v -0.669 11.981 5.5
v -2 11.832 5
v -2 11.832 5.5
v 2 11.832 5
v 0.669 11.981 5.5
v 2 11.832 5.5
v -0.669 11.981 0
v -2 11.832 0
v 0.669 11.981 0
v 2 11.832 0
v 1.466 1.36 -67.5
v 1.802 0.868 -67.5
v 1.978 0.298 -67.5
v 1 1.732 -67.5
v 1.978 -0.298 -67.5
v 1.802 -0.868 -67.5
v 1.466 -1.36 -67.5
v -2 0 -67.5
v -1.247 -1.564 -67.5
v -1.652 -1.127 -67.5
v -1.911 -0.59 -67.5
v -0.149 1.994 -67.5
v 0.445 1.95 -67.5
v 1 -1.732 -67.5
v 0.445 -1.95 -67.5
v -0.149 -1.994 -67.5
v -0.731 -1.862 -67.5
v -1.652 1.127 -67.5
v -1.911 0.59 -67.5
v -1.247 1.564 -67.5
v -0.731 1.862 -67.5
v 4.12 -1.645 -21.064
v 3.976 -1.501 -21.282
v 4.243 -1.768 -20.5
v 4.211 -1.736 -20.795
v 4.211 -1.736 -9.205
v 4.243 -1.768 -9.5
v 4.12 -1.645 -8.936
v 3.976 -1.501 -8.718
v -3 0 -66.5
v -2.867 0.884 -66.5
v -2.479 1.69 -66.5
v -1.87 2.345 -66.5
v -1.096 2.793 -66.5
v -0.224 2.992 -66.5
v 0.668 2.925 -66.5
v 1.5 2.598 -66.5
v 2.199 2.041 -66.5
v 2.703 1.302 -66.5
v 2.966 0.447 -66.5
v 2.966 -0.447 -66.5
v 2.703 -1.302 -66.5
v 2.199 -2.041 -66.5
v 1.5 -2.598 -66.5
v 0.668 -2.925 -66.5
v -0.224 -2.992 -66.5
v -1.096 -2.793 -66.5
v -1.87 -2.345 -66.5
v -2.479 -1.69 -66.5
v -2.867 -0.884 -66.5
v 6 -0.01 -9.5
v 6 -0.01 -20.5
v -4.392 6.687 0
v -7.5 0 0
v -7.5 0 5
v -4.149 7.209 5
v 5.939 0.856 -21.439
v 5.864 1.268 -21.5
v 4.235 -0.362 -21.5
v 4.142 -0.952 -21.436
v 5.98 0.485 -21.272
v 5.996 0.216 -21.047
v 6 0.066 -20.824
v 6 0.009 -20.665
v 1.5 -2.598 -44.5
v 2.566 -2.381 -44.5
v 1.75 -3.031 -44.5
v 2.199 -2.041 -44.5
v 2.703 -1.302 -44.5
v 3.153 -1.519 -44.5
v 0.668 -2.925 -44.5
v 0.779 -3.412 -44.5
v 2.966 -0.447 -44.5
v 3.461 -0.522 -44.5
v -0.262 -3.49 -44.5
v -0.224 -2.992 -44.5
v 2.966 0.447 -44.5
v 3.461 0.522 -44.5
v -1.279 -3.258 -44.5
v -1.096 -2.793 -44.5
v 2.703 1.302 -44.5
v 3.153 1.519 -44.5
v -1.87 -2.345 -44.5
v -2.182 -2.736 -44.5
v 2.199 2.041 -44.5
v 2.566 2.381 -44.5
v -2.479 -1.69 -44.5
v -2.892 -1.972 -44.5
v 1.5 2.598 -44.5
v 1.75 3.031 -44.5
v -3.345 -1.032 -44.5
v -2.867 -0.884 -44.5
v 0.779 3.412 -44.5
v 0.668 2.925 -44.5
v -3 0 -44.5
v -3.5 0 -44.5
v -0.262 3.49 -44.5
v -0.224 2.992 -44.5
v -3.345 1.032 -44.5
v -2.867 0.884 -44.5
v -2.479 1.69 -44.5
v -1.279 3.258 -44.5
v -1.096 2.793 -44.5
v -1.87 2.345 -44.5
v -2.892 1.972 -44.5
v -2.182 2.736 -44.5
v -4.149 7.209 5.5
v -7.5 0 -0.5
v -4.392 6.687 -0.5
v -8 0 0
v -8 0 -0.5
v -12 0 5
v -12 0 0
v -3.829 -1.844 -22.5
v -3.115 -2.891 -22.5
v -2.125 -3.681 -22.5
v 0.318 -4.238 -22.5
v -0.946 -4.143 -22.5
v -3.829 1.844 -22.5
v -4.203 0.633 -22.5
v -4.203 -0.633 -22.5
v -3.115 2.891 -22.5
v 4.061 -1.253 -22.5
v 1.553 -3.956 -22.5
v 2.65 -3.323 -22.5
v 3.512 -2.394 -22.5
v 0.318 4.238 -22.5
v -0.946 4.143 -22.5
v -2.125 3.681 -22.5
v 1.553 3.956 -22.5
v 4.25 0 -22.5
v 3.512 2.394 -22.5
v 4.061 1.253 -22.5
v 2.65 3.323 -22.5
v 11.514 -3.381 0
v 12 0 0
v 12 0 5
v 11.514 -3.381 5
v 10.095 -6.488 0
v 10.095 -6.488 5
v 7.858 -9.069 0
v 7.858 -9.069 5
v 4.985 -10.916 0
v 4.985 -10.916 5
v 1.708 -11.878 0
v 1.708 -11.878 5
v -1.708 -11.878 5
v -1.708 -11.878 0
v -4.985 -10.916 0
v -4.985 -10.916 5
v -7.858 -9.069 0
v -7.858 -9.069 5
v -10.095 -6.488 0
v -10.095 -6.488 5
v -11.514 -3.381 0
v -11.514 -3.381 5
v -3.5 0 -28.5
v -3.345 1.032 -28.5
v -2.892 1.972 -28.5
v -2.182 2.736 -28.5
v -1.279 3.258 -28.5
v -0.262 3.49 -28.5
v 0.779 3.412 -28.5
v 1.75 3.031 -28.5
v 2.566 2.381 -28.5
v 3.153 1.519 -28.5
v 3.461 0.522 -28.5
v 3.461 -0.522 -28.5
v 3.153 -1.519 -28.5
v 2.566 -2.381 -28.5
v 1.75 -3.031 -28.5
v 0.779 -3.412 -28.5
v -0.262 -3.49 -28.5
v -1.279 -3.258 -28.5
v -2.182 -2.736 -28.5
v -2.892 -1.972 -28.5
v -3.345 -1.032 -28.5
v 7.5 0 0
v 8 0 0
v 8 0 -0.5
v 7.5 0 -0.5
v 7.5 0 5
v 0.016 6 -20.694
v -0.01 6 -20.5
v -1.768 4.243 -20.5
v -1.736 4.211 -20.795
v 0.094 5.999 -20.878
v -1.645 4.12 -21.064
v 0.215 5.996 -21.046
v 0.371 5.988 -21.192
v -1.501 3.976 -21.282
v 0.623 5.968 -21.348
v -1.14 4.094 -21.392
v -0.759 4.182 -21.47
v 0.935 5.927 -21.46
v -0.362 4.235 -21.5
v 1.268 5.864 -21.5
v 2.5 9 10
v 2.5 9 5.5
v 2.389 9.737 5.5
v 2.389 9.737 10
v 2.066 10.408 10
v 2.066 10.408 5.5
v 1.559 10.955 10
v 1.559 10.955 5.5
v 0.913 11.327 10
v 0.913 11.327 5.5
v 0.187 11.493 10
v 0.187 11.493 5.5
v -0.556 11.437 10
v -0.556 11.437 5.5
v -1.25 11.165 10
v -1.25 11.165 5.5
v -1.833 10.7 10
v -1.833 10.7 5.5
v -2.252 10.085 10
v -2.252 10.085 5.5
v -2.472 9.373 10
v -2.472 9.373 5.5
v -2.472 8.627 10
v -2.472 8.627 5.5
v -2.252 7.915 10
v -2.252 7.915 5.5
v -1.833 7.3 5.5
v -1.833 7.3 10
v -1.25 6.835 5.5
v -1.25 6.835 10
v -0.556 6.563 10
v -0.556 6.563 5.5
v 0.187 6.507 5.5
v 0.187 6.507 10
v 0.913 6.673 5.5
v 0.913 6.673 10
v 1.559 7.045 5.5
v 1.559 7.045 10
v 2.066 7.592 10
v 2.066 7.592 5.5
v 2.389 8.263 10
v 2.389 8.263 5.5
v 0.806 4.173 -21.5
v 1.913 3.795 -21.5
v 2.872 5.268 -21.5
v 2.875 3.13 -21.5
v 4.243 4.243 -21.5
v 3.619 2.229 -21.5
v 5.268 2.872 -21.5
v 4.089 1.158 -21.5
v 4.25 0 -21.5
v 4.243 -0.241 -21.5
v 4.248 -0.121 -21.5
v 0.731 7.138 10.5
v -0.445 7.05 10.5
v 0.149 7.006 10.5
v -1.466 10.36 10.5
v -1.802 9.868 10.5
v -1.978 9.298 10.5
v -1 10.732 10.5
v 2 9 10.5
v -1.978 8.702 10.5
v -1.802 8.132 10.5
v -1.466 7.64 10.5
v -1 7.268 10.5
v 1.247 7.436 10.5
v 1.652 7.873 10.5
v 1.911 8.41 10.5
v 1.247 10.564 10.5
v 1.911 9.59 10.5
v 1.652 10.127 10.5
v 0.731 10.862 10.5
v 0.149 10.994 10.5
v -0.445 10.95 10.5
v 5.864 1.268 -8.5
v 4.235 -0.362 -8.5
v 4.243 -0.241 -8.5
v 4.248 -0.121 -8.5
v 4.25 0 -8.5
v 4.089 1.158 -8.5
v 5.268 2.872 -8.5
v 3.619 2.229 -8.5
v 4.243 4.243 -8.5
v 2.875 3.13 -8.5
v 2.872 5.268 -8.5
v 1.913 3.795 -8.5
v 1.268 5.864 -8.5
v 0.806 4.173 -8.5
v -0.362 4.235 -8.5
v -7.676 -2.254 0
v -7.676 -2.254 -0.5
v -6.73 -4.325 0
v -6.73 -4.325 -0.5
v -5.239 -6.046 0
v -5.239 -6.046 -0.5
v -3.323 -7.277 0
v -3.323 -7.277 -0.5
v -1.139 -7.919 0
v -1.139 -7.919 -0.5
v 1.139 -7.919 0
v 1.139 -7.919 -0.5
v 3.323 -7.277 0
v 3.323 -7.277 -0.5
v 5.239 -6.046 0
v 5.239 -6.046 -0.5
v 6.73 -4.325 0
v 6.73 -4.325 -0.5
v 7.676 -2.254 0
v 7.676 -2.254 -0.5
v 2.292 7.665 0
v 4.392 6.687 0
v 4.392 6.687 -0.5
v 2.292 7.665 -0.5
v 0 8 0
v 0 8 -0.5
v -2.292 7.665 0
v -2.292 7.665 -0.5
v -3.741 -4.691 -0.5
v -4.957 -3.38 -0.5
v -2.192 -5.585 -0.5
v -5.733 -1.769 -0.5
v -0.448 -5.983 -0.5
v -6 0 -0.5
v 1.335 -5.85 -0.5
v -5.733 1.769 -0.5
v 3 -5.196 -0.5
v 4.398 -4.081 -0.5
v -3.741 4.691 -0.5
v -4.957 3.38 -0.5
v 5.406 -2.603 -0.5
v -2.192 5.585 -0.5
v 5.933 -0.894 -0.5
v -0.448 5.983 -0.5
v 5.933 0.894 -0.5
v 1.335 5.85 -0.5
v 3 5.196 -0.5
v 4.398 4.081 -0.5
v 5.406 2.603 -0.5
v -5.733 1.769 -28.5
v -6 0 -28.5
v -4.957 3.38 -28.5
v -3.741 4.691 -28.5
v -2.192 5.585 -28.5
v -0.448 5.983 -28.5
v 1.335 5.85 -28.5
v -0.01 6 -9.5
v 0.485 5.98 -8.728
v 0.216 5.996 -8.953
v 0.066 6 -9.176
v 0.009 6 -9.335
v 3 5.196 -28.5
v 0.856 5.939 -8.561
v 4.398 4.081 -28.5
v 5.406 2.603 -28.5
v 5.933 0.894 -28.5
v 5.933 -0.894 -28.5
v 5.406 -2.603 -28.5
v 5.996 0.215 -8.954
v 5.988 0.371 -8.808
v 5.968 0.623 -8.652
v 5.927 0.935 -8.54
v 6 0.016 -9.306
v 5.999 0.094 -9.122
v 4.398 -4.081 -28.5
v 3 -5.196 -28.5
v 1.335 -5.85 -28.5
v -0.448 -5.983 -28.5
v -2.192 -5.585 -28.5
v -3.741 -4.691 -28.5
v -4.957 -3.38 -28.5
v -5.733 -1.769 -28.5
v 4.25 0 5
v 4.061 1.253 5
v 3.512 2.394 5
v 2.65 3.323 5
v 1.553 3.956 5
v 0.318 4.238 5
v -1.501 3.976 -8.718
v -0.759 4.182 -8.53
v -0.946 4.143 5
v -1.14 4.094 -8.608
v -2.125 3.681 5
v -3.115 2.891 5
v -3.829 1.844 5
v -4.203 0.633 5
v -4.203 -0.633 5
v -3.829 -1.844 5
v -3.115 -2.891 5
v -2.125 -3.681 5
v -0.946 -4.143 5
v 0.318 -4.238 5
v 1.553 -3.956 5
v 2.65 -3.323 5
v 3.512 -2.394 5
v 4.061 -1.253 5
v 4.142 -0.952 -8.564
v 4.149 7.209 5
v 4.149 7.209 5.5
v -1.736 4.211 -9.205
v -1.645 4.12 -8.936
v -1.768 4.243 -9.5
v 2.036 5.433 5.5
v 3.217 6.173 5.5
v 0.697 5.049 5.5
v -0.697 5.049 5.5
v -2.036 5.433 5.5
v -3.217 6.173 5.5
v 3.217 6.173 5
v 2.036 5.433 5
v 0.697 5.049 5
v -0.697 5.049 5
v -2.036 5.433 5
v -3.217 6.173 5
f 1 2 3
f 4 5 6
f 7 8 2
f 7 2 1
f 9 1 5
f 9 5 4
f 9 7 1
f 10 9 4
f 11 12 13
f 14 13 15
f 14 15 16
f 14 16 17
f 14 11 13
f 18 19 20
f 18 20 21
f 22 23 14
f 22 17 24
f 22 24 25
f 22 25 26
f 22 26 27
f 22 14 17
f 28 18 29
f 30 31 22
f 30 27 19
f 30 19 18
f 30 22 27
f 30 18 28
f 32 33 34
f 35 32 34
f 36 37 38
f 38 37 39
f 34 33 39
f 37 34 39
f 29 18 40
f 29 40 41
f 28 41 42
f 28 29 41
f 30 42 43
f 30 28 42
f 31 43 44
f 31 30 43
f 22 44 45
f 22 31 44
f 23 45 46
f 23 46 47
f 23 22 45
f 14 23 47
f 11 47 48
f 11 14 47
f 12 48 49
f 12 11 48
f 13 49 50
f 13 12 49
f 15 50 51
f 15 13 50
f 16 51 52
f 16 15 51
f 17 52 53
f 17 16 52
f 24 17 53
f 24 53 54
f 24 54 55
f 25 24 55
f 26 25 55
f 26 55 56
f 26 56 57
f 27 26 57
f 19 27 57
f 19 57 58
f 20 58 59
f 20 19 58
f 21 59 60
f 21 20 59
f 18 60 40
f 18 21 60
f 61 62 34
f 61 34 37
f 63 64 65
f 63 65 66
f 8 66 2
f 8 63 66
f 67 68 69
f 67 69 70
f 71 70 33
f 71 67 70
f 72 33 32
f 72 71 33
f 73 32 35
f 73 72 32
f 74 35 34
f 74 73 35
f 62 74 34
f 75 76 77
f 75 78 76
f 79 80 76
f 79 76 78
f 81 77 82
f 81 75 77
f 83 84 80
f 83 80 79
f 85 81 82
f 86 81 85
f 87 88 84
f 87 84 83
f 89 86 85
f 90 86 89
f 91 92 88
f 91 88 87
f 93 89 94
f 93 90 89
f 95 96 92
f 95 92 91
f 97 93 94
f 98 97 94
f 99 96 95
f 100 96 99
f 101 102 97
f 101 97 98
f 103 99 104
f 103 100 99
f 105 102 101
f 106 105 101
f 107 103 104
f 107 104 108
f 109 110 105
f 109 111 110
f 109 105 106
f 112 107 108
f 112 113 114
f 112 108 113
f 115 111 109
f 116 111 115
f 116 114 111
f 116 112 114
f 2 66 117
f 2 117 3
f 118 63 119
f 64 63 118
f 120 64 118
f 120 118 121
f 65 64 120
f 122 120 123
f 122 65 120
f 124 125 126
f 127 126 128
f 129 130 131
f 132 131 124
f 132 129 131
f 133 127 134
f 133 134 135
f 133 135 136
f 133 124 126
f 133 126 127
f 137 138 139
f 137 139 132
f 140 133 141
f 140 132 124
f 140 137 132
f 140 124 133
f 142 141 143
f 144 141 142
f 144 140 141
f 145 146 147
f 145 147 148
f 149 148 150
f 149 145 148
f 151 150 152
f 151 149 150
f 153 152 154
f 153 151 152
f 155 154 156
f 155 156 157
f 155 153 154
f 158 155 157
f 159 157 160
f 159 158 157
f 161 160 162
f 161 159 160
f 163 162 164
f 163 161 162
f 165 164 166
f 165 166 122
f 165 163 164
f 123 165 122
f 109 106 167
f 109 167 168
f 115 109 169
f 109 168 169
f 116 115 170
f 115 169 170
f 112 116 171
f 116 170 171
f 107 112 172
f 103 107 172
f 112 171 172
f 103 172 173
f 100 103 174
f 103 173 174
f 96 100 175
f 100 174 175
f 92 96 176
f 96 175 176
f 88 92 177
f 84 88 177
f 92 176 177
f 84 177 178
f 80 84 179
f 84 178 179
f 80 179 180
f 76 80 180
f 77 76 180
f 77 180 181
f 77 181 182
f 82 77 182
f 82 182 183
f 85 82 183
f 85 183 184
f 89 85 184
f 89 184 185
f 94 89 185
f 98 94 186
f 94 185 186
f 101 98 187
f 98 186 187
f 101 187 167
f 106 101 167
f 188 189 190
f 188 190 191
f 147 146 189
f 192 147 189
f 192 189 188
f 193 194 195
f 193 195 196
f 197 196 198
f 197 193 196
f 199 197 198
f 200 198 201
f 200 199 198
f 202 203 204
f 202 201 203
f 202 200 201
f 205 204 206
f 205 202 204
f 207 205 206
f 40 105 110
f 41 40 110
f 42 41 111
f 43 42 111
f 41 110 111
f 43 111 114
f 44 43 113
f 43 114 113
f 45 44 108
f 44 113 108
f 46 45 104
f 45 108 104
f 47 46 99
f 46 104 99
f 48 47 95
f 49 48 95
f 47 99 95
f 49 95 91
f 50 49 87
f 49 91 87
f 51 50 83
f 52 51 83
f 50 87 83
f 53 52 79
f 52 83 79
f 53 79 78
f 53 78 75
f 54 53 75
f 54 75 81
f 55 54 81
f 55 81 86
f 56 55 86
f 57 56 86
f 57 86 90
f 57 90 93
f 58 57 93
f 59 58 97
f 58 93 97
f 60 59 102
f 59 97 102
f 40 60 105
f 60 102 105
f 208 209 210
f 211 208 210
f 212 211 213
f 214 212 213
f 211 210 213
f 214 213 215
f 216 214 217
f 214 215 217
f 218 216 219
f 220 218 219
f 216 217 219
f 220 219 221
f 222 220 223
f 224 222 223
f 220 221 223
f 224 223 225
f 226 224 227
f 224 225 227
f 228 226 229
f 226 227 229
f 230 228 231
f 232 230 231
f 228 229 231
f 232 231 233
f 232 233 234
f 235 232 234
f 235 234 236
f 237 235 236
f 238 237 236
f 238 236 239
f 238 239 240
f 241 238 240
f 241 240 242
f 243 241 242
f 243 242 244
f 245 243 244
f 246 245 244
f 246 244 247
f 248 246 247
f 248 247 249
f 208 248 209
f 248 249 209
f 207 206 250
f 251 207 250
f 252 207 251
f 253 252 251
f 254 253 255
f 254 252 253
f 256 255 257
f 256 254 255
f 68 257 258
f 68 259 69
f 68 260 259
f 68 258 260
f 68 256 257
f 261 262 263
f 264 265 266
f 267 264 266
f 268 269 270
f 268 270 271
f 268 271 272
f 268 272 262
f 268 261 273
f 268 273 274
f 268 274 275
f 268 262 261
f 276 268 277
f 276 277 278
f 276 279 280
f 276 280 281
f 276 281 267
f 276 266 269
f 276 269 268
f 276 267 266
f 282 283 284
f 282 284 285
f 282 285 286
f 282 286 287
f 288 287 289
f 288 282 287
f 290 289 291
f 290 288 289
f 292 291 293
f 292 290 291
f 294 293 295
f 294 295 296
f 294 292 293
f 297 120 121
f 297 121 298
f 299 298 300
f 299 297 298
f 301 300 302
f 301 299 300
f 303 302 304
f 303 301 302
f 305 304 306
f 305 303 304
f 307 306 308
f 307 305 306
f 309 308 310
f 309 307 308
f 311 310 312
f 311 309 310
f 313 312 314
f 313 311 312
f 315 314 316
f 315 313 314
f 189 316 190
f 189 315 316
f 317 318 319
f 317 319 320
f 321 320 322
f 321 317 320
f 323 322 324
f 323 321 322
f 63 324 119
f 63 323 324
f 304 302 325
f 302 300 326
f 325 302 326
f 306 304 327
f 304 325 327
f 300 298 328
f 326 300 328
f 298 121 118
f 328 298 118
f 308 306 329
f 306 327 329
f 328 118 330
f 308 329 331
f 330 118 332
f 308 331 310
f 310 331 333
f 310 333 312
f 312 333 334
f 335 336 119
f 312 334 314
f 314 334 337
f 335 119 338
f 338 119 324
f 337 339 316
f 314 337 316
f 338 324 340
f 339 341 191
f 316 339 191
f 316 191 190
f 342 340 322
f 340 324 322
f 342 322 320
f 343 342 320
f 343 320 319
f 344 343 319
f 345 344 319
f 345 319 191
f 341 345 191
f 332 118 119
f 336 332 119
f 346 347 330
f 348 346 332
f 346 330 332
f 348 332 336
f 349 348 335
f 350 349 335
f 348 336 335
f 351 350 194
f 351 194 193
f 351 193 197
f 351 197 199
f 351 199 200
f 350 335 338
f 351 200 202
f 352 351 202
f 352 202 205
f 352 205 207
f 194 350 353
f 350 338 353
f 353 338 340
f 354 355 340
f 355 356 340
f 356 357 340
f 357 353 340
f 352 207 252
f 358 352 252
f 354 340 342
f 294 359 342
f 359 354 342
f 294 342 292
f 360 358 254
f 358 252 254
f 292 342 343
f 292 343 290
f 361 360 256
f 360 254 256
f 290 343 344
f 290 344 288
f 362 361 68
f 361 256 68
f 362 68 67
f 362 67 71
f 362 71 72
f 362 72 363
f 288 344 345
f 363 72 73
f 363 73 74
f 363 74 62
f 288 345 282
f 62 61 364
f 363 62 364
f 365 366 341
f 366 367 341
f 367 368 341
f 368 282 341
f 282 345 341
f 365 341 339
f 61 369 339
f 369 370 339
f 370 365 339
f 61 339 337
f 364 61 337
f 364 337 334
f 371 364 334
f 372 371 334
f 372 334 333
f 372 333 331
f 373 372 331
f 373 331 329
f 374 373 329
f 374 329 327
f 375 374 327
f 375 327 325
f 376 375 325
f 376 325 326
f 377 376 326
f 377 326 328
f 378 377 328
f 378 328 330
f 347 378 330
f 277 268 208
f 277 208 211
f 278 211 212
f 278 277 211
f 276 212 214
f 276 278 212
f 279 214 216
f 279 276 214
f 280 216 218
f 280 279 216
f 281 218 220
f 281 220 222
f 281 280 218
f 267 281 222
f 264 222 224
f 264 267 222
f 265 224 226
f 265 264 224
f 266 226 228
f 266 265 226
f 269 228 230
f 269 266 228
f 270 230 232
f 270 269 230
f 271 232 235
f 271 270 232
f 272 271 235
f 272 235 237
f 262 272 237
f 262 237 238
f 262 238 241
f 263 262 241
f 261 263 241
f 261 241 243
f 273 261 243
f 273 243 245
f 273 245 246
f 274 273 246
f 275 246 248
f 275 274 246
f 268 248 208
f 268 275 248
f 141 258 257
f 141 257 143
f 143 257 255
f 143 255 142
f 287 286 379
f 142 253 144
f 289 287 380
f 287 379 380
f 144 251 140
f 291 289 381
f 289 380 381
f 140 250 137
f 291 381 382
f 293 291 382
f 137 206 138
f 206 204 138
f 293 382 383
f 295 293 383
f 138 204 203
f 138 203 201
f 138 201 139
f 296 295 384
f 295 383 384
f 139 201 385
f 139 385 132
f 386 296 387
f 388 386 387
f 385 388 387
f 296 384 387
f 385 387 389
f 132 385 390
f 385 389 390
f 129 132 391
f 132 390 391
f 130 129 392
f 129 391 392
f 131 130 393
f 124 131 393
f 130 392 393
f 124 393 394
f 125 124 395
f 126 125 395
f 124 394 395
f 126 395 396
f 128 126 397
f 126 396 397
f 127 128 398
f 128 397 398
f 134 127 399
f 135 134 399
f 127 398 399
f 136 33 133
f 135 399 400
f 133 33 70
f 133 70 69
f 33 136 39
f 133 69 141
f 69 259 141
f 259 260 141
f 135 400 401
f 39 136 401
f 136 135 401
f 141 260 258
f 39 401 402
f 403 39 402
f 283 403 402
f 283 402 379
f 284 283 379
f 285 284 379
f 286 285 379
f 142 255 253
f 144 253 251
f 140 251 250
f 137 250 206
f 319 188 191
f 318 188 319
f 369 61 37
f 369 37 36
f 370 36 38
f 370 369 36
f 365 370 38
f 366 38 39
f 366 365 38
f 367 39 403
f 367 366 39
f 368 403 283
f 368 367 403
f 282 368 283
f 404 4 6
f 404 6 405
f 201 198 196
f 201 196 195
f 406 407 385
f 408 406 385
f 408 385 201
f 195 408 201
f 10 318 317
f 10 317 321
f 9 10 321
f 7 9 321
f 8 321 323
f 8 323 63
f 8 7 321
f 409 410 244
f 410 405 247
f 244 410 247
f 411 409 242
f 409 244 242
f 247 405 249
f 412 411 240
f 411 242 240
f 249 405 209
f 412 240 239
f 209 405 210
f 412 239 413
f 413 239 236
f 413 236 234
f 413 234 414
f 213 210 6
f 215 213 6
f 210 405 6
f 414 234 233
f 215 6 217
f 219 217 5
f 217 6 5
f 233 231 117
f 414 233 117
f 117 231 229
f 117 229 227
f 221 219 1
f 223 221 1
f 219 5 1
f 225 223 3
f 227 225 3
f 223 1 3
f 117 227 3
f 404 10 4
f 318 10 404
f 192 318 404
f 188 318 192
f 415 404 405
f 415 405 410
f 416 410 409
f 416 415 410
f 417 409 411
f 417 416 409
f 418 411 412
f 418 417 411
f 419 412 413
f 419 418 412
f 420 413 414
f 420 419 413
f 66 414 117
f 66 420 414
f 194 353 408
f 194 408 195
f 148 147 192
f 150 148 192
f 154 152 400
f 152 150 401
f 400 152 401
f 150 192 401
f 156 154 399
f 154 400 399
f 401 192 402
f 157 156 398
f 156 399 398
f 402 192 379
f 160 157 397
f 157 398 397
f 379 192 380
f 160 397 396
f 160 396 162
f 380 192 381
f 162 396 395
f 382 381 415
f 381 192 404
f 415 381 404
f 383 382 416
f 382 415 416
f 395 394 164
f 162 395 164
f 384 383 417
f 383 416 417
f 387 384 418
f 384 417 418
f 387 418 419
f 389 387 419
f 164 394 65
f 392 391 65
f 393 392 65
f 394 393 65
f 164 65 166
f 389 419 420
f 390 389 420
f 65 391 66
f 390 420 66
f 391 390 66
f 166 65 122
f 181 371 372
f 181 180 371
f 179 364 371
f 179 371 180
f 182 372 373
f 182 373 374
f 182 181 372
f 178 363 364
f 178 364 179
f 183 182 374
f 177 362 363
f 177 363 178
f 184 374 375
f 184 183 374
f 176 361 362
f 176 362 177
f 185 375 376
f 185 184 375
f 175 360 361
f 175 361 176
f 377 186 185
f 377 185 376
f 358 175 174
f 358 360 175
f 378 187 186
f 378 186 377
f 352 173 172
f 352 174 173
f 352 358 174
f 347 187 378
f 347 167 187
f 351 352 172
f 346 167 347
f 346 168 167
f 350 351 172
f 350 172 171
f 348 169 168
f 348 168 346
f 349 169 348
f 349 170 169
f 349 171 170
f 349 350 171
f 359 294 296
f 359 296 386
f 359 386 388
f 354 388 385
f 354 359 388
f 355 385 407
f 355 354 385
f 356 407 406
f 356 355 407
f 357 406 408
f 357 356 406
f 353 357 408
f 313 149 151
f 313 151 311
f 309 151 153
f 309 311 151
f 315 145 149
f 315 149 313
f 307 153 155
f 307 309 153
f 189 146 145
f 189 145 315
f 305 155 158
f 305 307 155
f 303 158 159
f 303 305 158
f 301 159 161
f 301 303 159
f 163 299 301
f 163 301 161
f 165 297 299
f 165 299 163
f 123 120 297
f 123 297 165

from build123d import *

# Parameters (mm, degrees)
BASE_EXTRUSION_DEPTH    = 5
BOSS_EXTRU_1_DEPTH      = 0.5
ESQUISSE3_R             = 2.5
BOSS_EXTRU_2_DEPTH      = 5
BOSS_EXTRU_3_DEPTH      = 0.5
ESQUISSE5_R             = 6
BOSS_EXTRU_4_DEPTH      = 28
ESQUISSE6_R             = 3.5
BOSS_EXTRU_5_DEPTH      = 16
ESQUISSE7_R             = 3
BOSS_EXTRU_6_DEPTH      = 23
CHANFREIN1_SIZE         = 1
ESQUISSE8_R             = 4.25
ENL_V_MAT_EXTRU_1_DEPTH = 28
ENL_V_MAT_EXTRU_4_DEPTH = 4.25
CHANFREIN2_SIZE         = 0.5


with BuildPart() as part:
    # Esquisse1 → Base-Extrusion (new body)
    with BuildSketch(Plane.XY):
        with BuildLine():
            Line((2, 11.832159566), (7.5, 0))
            Line((7.5, 0), (12, 0))
            ThreePointArc((12, 0), (0, -12), (-12, 0))
            Line((-12, 0), (-7.5, 0))
            Line((-7.5, 0), (-2, 11.832159566))
            ThreePointArc((-2, 11.832159566), (0, 12), (2, 11.832159566))
        make_face()
    extrude(amount=BASE_EXTRUSION_DEPTH)

    # Esquisse2 → Boss.-Extru.1 (add)
    with BuildSketch(Plane.XY.offset(5)):
        with BuildLine():
            Line((2, 11.832159566), (4.148812154, 7.209416242))
            ThreePointArc((4.148812154, 7.209416242), (0, 5), (-4.148812154, 7.209416242))
            Line((-4.148812154, 7.209416242), (-2, 11.832159566))
            ThreePointArc((-2, 11.832159566), (0, 12), (2, 11.832159566))
        make_face()
    extrude(amount=BOSS_EXTRU_1_DEPTH)

    # Esquisse3 → Boss.-Extru.2 (add)
    with BuildSketch(Plane.XY.offset(5.5)):
        with Locations((0, 9)):
            Circle(ESQUISSE3_R)
    extrude(amount=BOSS_EXTRU_2_DEPTH)

    # Esquisse4 → Boss.-Extru.3 (add)
    with BuildSketch(Plane(origin=(0, 0, 0), x_dir=(-1, 0, 0), z_dir=(0, 0, -1))):
        with BuildLine():
            Line((-8, 0), (-7.5, 0))
            Line((-7.5, 0), (-4.391777187, 6.686725143))
            ThreePointArc((-4.391777187, 6.686725143), (0, 8), (4.391777187, 6.686725143))
            Line((4.391777187, 6.686725143), (7.5, 0))
            Line((7.5, 0), (8, 0))
            ThreePointArc((8, 0), (0, -8), (-8, 0))
        make_face()
    extrude(amount=BOSS_EXTRU_3_DEPTH)

    # Esquisse5 → Boss.-Extru.4 (add)
    with BuildSketch(Plane(origin=(0, 0, -0.5), x_dir=(-1, 0, 0), z_dir=(0, 0, -1))):
        Circle(ESQUISSE5_R)
    extrude(amount=BOSS_EXTRU_4_DEPTH)

    # Esquisse6 → Boss.-Extru.5 (add)
    with BuildSketch(Plane(origin=(0, 0, -28.5), x_dir=(-1, 0, 0), z_dir=(0, 0, -1))):
        Circle(ESQUISSE6_R)
    extrude(amount=BOSS_EXTRU_5_DEPTH)

    # Esquisse7 → Boss.-Extru.6 (add)
    with BuildSketch(Plane(origin=(0, 0, -44.5), x_dir=(-1, 0, 0), z_dir=(0, 0, -1))):
        Circle(ESQUISSE7_R)
    extrude(amount=BOSS_EXTRU_6_DEPTH)

    # Chanfrein1
    chanfrein1_edges = [part.edges().sort_by_distance(p)[0] for p in [
        (3, 0, -67.5),
    ]]
    chamfer(chanfrein1_edges, length=CHANFREIN1_SIZE)

    # Esquisse8 → Enlèv. mat.-Extru.1 (cut)
    with BuildSketch(Plane.XY.offset(5.5)):
        Circle(ESQUISSE8_R)
    extrude(amount=-ENL_V_MAT_EXTRU_1_DEPTH, mode=Mode.SUBTRACT)

    # Esquisse12 → Enlèv. mat.-Extru.4 (cut)
    with BuildSketch(Plane(origin=(4.242640687, 4.242640687, -14.5), x_dir=(-0.7071067811865462, 0.7071067811865489, 0), z_dir=(0.7071067811865489, 0.7071067811865462, 0))):
        with BuildLine():
            Line((-3.25, 6), (3.25, 6))
            ThreePointArc((3.25, 6), (3.957106781, 5.707106781), (4.25, 5))
            Line((4.25, 5), (4.25, -6))
            ThreePointArc((4.25, -6), (3.957106781, -6.707106781), (3.25, -7))
            Line((3.25, -7), (-3.25, -7))
            ThreePointArc((-3.25, -7), (-3.957106781, -6.707106781), (-4.25, -6))
            Line((-4.25, -6), (-4.25, 5))
            ThreePointArc((-4.25, 5), (-3.957106781, 5.707106781), (-3.25, 6))
        make_face()
    extrude(amount=-ENL_V_MAT_EXTRU_4_DEPTH, mode=Mode.SUBTRACT)

    # Chanfrein2
    chanfrein2_edges = [part.edges().sort_by_distance(p)[0] for p in [
        (-2.5, 9, 10.5),
    ]]
    chamfer(chanfrein2_edges, length=CHANFREIN2_SIZE)


solid = part.part
